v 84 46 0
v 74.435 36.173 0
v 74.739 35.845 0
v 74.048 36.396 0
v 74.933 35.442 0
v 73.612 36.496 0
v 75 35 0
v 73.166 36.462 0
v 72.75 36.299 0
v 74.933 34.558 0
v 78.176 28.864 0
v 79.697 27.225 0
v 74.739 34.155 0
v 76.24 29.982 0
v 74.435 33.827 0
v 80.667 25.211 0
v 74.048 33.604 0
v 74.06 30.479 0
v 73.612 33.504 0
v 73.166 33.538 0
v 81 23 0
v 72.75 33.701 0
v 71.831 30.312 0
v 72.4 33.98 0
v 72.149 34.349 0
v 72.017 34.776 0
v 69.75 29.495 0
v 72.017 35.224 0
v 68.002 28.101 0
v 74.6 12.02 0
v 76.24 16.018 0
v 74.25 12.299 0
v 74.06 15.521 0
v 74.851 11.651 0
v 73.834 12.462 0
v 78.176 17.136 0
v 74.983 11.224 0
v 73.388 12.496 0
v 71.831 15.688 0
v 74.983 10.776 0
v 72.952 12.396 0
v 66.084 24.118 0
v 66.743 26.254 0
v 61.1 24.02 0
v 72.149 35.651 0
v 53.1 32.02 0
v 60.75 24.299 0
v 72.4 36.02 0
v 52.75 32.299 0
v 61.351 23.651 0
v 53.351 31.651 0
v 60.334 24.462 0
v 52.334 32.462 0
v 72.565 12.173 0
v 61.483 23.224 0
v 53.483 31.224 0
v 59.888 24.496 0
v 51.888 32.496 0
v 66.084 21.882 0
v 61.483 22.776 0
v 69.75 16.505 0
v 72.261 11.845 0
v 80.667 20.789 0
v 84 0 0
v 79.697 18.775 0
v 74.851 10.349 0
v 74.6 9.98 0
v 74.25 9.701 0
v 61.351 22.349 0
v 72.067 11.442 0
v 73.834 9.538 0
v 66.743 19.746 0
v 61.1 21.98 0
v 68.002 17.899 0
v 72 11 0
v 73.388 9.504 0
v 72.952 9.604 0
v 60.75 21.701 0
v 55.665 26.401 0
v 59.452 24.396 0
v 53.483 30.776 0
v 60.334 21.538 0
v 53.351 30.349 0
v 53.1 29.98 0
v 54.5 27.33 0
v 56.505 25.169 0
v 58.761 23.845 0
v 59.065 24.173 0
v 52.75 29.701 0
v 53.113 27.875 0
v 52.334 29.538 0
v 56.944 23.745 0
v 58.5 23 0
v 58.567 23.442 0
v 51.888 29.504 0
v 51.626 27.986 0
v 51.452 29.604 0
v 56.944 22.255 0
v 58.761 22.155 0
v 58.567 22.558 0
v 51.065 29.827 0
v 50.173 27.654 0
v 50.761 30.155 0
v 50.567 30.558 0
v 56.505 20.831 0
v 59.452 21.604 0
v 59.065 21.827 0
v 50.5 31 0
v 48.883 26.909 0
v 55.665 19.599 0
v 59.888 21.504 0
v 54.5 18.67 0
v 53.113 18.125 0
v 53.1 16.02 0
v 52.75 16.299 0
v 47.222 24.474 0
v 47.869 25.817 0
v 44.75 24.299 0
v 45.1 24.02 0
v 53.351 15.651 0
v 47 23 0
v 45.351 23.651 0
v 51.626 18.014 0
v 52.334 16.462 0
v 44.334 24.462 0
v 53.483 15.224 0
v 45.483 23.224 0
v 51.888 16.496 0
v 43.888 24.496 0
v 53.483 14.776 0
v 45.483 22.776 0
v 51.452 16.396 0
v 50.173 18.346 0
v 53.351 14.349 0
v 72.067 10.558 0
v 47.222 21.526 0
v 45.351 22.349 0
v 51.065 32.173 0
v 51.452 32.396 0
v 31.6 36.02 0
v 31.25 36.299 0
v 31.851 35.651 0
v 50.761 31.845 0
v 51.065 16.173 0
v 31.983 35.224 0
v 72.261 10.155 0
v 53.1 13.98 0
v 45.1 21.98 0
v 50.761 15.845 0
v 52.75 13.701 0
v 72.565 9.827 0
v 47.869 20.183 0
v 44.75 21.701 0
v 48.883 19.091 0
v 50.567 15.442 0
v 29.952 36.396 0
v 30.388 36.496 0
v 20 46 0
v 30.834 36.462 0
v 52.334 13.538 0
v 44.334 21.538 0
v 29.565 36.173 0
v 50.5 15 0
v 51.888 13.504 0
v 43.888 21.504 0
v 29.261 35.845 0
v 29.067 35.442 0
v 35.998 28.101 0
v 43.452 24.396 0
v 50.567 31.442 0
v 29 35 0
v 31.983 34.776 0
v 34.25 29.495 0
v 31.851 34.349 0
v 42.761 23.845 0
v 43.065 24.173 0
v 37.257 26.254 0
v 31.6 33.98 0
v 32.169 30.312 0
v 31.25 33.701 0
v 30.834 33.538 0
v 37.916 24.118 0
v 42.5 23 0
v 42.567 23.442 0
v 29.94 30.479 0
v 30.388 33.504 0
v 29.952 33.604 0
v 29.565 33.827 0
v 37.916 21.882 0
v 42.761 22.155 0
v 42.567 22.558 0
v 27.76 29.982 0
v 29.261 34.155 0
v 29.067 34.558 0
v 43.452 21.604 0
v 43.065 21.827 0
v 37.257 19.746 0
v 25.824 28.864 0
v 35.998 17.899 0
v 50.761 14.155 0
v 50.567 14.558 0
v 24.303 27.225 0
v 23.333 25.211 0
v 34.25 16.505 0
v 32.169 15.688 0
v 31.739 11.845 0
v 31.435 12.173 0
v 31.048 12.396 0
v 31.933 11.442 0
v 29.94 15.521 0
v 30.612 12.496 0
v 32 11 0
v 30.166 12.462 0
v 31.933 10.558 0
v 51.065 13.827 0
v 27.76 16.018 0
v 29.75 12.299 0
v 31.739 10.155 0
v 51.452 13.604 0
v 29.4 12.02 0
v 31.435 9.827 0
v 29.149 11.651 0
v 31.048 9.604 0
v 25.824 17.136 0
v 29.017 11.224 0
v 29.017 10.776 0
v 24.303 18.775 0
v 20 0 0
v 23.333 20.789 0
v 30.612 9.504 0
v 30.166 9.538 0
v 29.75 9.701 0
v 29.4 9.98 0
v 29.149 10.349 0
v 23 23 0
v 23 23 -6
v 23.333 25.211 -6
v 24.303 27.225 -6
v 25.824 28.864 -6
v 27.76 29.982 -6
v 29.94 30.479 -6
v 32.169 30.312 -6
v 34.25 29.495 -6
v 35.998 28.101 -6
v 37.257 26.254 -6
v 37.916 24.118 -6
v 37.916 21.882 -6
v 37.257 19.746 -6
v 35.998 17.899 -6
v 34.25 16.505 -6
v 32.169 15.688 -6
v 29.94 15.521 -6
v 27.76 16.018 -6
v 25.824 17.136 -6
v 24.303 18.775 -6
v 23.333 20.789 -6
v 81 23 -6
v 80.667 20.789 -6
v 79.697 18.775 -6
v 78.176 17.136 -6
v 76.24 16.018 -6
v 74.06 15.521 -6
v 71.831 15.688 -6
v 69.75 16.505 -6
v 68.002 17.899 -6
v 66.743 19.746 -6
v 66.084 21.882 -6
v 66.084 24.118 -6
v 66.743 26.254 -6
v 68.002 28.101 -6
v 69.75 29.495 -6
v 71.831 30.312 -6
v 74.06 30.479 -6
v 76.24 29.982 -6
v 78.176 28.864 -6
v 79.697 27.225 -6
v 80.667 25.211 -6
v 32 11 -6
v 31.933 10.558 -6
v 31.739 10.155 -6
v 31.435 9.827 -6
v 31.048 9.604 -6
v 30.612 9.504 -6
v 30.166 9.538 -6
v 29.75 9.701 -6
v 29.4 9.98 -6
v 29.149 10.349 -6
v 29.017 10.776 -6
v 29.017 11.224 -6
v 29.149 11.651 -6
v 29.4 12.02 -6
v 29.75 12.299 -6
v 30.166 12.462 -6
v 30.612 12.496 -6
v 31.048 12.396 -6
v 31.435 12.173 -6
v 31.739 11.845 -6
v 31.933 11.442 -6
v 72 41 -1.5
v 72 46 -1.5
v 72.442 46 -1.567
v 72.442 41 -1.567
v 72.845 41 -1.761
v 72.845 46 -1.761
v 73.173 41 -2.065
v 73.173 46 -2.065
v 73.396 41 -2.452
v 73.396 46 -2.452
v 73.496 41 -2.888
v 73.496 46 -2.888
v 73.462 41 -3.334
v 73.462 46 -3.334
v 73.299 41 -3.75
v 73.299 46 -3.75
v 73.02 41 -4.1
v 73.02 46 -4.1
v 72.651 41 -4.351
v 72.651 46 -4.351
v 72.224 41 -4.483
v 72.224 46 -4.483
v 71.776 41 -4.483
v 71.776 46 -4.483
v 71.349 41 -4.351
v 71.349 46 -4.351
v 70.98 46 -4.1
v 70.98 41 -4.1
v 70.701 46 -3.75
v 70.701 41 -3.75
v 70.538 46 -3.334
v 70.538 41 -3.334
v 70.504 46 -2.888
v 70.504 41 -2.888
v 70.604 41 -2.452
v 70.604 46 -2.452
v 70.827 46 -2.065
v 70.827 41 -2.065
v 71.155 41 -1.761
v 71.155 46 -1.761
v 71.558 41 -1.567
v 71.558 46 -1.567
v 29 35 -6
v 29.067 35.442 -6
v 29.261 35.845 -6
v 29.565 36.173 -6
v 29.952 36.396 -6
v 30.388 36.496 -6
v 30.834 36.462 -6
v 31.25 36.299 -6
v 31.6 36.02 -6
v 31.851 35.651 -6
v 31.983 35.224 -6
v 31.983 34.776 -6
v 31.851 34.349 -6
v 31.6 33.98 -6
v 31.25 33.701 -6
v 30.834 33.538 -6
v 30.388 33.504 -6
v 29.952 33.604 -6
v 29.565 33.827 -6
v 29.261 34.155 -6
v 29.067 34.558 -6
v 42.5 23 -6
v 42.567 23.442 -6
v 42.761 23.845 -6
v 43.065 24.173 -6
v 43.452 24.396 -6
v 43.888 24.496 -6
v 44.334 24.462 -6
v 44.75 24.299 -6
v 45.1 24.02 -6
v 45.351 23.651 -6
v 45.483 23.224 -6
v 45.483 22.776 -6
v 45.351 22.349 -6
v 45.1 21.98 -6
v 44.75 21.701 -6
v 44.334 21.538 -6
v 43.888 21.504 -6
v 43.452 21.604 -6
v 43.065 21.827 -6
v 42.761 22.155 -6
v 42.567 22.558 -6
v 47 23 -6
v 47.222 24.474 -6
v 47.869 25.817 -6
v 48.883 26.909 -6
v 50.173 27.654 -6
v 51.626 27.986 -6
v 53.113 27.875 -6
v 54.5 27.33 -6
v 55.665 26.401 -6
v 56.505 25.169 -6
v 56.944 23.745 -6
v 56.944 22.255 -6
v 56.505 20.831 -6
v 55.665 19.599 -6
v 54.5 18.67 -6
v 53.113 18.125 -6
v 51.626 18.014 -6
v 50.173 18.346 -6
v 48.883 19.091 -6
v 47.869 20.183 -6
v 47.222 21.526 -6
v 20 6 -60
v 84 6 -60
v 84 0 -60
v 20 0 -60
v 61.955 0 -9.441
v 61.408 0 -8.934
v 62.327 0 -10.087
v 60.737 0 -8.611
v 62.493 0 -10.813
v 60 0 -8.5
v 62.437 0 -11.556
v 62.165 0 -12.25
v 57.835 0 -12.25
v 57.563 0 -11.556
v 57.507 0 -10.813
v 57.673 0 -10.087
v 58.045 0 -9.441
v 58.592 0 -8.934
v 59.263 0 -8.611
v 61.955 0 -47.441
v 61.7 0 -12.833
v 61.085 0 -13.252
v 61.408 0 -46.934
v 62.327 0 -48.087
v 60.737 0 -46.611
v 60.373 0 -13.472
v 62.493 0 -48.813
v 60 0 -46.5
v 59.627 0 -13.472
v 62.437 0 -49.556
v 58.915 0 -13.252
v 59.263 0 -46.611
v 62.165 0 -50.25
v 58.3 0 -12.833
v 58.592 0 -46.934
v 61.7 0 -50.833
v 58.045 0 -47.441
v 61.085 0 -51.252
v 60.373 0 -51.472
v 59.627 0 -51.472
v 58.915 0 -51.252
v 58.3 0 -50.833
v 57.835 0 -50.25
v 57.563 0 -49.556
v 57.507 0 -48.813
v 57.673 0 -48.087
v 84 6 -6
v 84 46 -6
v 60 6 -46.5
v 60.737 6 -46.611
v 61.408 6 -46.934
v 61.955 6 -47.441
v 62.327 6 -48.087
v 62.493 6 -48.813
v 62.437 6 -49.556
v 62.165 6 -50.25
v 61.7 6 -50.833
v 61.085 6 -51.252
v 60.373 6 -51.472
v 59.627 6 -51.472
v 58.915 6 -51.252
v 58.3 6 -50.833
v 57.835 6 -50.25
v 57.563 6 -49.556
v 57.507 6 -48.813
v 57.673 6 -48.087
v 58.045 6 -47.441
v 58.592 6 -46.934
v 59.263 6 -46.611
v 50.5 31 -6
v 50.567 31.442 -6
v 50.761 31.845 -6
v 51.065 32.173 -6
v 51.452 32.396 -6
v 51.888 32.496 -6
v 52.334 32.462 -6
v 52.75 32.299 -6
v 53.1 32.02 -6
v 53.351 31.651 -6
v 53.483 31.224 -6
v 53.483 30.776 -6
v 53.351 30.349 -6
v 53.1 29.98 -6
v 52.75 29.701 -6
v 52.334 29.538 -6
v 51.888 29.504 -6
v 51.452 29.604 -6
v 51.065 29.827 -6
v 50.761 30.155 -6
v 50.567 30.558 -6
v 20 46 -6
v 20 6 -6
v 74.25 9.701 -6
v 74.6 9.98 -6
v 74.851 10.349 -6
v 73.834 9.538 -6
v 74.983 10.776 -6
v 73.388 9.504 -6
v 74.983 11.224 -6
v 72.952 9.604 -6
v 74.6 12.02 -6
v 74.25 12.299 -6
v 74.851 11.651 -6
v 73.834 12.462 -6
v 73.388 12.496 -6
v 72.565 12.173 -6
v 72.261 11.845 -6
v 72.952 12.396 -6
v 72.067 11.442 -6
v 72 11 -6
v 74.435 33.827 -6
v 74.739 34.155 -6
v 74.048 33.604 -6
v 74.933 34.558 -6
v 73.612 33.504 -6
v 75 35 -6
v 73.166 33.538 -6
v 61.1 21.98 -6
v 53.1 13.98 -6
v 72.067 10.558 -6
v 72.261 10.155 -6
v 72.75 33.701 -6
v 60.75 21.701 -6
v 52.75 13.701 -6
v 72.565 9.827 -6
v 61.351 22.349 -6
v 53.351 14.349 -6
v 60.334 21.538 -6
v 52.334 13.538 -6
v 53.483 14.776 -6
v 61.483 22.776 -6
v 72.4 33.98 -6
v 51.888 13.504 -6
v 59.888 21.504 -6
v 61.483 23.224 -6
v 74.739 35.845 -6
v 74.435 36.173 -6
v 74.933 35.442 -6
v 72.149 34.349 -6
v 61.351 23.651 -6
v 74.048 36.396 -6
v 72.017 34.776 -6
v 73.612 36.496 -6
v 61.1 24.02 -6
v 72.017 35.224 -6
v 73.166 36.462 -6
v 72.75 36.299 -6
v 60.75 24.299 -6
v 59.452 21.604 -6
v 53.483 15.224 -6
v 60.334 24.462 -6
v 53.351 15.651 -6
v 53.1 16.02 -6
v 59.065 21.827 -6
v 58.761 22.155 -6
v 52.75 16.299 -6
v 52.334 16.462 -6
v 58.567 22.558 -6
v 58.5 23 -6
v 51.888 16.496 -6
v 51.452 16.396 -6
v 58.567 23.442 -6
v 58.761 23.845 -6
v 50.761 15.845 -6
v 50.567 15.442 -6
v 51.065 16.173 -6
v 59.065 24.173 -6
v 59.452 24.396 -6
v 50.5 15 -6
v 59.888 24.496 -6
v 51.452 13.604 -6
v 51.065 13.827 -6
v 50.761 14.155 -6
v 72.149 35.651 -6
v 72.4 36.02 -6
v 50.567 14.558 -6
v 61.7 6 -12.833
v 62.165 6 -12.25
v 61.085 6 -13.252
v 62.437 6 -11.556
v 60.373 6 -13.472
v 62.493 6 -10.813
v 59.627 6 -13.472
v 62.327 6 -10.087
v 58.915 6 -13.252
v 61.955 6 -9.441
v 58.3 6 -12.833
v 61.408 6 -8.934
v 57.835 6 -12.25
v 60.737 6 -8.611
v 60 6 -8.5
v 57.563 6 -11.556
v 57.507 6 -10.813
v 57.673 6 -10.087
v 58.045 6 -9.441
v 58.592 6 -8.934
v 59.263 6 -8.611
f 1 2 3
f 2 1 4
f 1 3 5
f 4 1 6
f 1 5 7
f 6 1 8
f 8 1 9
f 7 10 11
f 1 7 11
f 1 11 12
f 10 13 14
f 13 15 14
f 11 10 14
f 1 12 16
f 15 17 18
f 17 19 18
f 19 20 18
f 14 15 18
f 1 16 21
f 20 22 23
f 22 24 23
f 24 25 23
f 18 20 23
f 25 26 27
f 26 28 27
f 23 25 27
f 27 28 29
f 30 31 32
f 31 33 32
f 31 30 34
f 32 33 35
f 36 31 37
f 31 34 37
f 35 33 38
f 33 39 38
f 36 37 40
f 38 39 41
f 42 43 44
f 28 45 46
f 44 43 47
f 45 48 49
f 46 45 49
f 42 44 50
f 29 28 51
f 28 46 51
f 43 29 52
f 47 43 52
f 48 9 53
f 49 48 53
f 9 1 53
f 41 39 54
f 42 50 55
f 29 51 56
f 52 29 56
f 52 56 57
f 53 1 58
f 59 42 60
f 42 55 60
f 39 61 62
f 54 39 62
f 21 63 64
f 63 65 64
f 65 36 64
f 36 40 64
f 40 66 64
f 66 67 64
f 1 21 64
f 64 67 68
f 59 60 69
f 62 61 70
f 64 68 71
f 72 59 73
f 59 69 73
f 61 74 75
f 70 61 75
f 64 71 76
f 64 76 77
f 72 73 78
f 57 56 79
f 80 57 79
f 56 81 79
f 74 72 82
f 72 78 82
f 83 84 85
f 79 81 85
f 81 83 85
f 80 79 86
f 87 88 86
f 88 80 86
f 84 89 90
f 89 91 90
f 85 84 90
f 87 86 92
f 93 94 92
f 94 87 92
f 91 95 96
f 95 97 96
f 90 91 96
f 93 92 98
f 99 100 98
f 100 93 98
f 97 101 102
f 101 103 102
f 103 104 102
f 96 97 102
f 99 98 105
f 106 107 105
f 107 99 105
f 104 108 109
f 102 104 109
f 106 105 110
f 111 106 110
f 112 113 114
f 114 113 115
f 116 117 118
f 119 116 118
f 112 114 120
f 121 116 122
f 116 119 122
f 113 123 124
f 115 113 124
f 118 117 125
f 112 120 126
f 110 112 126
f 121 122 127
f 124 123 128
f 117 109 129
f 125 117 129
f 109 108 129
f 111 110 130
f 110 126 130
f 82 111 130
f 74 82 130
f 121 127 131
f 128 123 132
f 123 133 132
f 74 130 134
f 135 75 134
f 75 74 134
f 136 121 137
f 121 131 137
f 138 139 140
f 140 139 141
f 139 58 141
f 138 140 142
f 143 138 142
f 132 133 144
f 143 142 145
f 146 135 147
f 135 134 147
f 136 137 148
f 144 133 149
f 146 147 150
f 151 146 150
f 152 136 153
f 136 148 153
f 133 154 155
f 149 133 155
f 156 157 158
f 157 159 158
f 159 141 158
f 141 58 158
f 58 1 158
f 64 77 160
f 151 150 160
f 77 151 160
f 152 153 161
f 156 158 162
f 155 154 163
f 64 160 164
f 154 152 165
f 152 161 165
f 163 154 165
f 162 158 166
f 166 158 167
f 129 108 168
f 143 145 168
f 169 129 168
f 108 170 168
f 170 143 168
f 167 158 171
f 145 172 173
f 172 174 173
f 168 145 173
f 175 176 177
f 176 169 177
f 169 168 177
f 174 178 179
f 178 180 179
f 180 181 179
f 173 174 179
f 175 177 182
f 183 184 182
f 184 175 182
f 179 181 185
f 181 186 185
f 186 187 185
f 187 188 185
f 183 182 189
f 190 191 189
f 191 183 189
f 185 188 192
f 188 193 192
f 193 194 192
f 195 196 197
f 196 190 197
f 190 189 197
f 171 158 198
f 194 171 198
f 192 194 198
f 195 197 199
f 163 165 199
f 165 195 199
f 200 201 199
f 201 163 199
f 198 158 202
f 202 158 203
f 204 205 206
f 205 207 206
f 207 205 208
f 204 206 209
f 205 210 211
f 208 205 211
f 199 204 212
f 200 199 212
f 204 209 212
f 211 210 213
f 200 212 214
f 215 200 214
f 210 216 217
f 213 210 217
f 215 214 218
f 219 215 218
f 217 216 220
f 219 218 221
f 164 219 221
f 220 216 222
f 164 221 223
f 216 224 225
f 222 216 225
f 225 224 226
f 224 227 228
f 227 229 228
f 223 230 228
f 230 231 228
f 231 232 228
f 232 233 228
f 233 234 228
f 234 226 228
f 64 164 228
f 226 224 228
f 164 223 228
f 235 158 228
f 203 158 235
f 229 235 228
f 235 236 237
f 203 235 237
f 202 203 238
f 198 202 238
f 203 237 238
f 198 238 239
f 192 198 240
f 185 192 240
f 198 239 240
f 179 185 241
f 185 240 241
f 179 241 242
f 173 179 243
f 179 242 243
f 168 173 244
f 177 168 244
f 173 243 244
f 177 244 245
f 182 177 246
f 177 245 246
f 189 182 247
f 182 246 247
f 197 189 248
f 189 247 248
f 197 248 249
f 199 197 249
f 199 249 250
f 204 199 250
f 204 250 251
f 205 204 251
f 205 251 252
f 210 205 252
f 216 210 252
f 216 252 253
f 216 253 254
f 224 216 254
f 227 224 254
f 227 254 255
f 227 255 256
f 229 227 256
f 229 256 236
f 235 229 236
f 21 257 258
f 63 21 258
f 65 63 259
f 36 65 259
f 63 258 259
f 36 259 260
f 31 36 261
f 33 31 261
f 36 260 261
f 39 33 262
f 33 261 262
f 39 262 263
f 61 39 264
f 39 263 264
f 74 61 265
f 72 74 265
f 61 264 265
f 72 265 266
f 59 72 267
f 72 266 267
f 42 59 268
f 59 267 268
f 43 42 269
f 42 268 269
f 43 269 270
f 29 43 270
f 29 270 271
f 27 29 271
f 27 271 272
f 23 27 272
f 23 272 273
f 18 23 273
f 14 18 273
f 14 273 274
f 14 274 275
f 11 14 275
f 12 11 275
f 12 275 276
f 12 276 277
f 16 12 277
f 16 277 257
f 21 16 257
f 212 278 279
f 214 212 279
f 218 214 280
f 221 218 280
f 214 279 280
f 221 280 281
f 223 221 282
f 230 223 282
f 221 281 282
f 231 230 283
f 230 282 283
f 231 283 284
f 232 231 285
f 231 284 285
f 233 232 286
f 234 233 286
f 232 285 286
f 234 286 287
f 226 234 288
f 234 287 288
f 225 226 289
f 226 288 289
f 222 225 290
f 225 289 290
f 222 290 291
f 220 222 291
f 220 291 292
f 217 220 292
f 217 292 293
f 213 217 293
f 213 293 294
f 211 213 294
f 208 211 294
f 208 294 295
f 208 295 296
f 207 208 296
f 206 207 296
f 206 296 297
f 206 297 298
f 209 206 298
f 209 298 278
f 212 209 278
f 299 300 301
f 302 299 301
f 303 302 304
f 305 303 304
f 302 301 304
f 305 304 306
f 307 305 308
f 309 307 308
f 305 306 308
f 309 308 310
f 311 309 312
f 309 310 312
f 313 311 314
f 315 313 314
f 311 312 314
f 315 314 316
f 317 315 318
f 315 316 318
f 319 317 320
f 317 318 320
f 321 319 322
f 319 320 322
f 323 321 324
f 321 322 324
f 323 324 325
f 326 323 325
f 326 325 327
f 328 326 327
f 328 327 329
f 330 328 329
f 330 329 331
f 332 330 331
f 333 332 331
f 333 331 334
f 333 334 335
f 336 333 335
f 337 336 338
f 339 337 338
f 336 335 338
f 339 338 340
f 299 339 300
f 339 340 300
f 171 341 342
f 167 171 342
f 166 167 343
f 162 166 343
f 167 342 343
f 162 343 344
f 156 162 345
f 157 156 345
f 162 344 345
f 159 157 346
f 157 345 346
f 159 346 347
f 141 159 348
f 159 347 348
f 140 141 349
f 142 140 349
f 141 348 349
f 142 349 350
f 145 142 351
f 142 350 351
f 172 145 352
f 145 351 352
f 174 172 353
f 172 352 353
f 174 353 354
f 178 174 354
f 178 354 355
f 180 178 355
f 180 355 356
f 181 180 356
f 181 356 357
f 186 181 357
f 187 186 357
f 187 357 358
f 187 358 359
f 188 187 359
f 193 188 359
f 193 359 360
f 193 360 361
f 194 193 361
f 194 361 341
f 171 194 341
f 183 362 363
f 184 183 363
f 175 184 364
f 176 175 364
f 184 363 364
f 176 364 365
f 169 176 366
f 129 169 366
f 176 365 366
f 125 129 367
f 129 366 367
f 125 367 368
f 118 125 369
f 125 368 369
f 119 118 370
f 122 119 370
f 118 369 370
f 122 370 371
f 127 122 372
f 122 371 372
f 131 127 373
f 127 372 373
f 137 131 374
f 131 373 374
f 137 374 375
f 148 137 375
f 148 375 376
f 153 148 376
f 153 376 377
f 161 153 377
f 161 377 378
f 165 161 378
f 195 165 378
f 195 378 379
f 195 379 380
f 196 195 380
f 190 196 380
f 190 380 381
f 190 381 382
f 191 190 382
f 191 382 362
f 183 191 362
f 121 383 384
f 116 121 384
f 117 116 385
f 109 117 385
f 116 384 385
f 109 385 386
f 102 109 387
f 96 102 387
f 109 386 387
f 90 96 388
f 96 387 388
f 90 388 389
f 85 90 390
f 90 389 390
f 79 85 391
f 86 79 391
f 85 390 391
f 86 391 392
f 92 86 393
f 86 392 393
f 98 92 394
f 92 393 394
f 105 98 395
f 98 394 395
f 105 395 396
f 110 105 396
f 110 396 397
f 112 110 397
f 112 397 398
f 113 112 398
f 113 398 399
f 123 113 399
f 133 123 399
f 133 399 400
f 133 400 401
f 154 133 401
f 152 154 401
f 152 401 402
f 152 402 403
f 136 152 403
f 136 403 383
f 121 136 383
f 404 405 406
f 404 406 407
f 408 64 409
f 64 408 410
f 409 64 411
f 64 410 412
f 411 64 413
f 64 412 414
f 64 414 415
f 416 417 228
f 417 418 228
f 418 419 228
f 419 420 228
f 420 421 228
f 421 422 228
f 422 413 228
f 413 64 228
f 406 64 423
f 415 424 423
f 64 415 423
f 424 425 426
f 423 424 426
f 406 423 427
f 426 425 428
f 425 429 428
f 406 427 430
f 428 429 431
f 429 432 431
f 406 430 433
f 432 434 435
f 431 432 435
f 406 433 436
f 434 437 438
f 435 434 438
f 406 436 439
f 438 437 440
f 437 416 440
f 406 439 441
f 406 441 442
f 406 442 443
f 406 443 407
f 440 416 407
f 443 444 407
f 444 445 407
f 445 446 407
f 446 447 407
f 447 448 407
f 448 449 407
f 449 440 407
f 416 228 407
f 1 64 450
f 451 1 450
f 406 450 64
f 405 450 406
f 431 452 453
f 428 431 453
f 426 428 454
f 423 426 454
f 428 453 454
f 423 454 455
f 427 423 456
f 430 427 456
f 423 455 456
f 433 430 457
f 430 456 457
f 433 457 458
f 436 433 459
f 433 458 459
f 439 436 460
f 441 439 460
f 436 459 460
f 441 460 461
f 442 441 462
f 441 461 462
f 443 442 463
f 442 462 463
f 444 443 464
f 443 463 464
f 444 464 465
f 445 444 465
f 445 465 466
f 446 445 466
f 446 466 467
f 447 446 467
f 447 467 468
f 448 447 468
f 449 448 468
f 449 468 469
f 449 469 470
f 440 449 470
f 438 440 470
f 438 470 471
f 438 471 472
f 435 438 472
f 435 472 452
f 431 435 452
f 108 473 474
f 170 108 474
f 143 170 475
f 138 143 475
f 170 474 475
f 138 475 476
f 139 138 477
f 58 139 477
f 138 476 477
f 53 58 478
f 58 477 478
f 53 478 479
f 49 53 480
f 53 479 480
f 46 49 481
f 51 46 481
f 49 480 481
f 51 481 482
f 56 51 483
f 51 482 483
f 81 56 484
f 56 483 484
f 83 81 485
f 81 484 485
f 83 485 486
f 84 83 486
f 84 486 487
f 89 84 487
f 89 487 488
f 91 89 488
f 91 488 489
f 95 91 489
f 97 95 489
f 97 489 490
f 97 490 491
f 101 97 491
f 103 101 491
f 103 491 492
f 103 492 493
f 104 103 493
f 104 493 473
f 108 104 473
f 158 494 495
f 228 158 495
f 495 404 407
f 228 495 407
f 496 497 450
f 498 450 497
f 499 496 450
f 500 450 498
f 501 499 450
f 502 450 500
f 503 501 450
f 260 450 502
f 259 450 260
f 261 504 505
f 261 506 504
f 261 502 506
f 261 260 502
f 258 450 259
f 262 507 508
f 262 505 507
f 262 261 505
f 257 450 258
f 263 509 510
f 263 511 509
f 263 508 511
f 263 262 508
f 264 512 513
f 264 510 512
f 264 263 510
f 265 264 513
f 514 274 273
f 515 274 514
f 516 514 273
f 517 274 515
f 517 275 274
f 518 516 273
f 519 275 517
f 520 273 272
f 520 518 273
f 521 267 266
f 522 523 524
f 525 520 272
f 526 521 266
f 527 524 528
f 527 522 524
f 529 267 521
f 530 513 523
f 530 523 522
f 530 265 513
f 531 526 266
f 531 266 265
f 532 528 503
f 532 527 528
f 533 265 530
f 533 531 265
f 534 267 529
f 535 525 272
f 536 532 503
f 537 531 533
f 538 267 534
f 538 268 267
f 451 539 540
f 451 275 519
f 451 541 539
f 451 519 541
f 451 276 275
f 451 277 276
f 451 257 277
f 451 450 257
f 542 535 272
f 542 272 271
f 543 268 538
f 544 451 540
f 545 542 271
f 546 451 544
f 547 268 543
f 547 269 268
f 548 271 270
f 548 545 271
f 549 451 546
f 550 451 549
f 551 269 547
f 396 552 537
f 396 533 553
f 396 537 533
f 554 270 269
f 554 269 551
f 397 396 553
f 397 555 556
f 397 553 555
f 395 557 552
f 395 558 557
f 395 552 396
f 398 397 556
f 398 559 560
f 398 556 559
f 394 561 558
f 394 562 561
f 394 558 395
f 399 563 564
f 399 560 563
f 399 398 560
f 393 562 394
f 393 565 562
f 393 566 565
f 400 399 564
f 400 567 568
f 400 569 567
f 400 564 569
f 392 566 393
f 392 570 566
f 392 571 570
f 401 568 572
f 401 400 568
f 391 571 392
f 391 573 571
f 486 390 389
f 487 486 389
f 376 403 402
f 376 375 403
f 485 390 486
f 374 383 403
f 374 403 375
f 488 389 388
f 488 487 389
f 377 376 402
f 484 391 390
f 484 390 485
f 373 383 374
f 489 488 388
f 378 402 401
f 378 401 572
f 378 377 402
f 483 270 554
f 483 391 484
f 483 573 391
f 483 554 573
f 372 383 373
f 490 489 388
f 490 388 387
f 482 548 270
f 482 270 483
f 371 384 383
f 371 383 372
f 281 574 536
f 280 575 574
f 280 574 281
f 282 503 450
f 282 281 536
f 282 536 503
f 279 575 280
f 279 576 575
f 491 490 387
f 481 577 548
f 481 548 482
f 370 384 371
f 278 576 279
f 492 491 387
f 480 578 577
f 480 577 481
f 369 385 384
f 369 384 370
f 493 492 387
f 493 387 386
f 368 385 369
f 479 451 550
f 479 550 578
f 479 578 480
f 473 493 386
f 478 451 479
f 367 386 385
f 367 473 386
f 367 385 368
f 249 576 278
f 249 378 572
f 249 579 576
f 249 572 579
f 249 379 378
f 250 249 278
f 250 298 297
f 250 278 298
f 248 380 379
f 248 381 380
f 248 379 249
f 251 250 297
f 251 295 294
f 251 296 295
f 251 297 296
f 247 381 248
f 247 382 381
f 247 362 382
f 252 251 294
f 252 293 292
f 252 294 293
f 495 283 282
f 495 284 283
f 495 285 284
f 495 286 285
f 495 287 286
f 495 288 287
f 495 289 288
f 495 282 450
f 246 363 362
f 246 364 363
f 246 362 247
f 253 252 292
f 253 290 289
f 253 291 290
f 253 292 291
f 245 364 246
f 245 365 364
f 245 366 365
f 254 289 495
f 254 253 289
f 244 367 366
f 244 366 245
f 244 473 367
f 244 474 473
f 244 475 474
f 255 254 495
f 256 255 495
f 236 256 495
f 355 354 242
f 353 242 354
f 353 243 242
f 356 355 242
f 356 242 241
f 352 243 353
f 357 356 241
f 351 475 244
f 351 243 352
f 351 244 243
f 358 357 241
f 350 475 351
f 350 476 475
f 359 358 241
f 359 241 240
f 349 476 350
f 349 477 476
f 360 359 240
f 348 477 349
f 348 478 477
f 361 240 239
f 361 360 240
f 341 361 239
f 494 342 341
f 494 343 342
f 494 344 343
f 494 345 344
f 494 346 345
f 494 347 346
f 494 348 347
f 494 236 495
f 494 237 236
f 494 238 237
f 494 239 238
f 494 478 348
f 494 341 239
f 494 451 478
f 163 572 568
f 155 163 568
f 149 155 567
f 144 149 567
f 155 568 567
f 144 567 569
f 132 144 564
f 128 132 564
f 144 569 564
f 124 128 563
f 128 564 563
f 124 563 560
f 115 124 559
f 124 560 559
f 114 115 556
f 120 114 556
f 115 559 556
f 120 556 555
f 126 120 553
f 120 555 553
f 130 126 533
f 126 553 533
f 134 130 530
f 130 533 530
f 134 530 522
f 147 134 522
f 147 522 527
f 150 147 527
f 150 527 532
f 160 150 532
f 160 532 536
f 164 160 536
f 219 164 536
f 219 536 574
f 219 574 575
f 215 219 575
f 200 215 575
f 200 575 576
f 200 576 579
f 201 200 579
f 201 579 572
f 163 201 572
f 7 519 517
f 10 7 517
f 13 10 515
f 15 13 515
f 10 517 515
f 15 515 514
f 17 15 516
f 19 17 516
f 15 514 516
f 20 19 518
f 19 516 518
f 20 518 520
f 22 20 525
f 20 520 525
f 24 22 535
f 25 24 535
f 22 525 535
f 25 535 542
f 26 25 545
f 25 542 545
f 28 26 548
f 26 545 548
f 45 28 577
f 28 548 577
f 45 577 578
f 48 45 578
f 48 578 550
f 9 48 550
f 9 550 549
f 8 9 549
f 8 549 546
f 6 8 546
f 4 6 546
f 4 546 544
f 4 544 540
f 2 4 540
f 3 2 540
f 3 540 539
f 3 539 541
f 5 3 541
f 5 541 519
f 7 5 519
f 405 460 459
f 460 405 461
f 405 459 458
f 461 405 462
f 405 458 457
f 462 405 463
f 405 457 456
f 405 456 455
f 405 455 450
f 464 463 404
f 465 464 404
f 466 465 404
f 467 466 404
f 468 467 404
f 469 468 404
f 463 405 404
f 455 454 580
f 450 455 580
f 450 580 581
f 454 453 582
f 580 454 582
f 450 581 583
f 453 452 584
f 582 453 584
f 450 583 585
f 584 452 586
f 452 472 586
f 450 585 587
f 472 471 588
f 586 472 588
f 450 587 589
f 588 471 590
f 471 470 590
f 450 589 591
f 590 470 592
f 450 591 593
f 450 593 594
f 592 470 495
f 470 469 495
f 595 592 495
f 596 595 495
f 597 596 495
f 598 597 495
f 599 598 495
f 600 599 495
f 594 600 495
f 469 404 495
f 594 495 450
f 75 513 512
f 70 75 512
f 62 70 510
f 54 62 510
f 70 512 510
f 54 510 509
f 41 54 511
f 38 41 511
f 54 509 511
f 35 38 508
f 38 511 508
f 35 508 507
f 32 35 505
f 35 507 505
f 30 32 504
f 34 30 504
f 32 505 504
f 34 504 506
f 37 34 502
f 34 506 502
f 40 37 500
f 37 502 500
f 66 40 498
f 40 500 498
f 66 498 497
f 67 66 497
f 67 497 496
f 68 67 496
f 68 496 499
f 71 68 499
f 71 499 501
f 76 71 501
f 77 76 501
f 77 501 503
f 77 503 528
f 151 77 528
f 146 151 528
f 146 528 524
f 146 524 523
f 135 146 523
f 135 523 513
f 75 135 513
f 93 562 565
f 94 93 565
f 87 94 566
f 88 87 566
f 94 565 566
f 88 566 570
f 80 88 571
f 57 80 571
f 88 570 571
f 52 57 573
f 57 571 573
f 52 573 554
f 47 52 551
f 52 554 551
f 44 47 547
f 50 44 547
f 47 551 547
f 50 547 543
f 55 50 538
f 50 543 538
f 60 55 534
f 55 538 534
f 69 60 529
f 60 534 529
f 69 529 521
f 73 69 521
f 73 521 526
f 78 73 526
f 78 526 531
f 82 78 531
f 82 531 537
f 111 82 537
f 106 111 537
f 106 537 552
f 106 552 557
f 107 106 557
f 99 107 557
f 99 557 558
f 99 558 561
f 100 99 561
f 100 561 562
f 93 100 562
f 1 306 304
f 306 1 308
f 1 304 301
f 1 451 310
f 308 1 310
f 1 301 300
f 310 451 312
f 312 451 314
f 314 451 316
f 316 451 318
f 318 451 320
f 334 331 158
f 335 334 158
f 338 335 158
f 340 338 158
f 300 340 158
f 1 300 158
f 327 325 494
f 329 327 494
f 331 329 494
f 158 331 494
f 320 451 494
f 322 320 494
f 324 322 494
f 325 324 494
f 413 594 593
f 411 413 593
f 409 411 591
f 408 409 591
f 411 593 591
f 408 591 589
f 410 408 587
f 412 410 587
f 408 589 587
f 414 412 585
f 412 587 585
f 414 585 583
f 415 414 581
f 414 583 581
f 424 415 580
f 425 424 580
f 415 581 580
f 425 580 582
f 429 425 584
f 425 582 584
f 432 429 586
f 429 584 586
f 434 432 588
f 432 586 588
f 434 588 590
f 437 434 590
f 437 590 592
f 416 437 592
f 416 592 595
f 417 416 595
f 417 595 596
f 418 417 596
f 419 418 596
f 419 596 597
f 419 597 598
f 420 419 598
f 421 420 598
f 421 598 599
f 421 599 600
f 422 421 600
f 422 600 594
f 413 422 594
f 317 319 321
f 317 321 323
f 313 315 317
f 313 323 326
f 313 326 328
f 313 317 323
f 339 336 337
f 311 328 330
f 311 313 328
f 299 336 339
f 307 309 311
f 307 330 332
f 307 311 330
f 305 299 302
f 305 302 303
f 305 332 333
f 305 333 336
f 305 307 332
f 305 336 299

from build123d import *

# Parameters (mm, degrees)
EXTRUDE_1_DEPTH     = 104
SKETCH_2_R          = 2.5
CUT_EXTRUDE_1_DEPTH = 151.638640461
SKETCH_3_R          = 5
SKETCH_3_R_2        = 1.5
SKETCH_3_R_3        = 7.5
CUT_EXTRUDE_2_DEPTH = 142.887279204
SKETCH_4_R          = 1.5
CUT_EXTRUDE_3_DEPTH = 5


with BuildPart() as part:
    # 草图1 → 凸台-拉伸1 (new body)
    with BuildSketch(Plane(origin=(0, 0, 0), x_dir=(0, 0, -1), z_dir=(1, 0, 0))):
        Polygon((0, 0), (80, 0), (80, 6), (6, 6), (6, 80), (0, 80), (0, 6), align=None)
    extrude(amount=EXTRUDE_1_DEPTH)

    # 草图2 → 切除-拉伸1 (cut, through all)
    with BuildSketch(Plane(origin=(0, 6, 0), x_dir=(1, 0, 0), z_dir=(0, 1, 0))):
        with Locations(Location((60, 11, 0), (0, 0, 270))):
            Circle(SKETCH_2_R)
        with Locations(Location((60, 49, 0), (0, 0, 270))):
            Circle(SKETCH_2_R)
        Polygon((84, 60), (20, 60), (20, 6), (0, 6), (0, 80), (84, 80), (104, 80), (104, 6), (84, 6), align=None)
    extrude(amount=-CUT_EXTRUDE_1_DEPTH, mode=Mode.SUBTRACT)

    # 草图3 → 切除-拉伸2 (cut, through all)
    with BuildSketch(Plane(origin=(0, 0, -6), x_dir=(-1, 0, 0), z_dir=(0, 0, -1))):
        with Locations((-52, 23)):
            Circle(SKETCH_3_R)
        with Locations((-52, 15)):
            Circle(SKETCH_3_R_2)
        with Locations((-60, 23)):
            Circle(SKETCH_3_R_2)
        with Locations((-52, 31)):
            Circle(SKETCH_3_R_2)
        with Locations((-44, 23)):
            Circle(SKETCH_3_R_2)
        with Locations((-30.5, 23)):
            Circle(SKETCH_3_R_3)
        with Locations((-30.5, 35)):
            Circle(SKETCH_3_R_2)
        with Locations(Location((-30.5, 11, 0), (0, 0, 180))):
            Circle(SKETCH_3_R_2)
        with Locations((-73.5, 11)):
            Circle(SKETCH_3_R_2)
        with Locations(Location((-73.5, 23, 0), (0, 0, 180))):
            Circle(SKETCH_3_R_3)
        with Locations(Location((-73.5, 35, 0), (0, 0, 180))):
            Circle(SKETCH_3_R_2)
        Polygon((-84, 0), (-84, 46), (-20, 46), (-20, 0), (0, 0), (0, 80), (-104, 80), (-104, 0), align=None)
    extrude(amount=-CUT_EXTRUDE_2_DEPTH, mode=Mode.SUBTRACT)

    # 草图4 → 切除-拉伸3 (cut)
    with BuildSketch(Plane(origin=(0, 46, 0), x_dir=(1, 0, 0), z_dir=(0, 1, 0))):
        with Locations(Location((72, 3, 0), (0, 0, 270))):
            Circle(SKETCH_4_R)
    extrude(amount=-CUT_EXTRUDE_3_DEPTH, mode=Mode.SUBTRACT)


solid = part.part
